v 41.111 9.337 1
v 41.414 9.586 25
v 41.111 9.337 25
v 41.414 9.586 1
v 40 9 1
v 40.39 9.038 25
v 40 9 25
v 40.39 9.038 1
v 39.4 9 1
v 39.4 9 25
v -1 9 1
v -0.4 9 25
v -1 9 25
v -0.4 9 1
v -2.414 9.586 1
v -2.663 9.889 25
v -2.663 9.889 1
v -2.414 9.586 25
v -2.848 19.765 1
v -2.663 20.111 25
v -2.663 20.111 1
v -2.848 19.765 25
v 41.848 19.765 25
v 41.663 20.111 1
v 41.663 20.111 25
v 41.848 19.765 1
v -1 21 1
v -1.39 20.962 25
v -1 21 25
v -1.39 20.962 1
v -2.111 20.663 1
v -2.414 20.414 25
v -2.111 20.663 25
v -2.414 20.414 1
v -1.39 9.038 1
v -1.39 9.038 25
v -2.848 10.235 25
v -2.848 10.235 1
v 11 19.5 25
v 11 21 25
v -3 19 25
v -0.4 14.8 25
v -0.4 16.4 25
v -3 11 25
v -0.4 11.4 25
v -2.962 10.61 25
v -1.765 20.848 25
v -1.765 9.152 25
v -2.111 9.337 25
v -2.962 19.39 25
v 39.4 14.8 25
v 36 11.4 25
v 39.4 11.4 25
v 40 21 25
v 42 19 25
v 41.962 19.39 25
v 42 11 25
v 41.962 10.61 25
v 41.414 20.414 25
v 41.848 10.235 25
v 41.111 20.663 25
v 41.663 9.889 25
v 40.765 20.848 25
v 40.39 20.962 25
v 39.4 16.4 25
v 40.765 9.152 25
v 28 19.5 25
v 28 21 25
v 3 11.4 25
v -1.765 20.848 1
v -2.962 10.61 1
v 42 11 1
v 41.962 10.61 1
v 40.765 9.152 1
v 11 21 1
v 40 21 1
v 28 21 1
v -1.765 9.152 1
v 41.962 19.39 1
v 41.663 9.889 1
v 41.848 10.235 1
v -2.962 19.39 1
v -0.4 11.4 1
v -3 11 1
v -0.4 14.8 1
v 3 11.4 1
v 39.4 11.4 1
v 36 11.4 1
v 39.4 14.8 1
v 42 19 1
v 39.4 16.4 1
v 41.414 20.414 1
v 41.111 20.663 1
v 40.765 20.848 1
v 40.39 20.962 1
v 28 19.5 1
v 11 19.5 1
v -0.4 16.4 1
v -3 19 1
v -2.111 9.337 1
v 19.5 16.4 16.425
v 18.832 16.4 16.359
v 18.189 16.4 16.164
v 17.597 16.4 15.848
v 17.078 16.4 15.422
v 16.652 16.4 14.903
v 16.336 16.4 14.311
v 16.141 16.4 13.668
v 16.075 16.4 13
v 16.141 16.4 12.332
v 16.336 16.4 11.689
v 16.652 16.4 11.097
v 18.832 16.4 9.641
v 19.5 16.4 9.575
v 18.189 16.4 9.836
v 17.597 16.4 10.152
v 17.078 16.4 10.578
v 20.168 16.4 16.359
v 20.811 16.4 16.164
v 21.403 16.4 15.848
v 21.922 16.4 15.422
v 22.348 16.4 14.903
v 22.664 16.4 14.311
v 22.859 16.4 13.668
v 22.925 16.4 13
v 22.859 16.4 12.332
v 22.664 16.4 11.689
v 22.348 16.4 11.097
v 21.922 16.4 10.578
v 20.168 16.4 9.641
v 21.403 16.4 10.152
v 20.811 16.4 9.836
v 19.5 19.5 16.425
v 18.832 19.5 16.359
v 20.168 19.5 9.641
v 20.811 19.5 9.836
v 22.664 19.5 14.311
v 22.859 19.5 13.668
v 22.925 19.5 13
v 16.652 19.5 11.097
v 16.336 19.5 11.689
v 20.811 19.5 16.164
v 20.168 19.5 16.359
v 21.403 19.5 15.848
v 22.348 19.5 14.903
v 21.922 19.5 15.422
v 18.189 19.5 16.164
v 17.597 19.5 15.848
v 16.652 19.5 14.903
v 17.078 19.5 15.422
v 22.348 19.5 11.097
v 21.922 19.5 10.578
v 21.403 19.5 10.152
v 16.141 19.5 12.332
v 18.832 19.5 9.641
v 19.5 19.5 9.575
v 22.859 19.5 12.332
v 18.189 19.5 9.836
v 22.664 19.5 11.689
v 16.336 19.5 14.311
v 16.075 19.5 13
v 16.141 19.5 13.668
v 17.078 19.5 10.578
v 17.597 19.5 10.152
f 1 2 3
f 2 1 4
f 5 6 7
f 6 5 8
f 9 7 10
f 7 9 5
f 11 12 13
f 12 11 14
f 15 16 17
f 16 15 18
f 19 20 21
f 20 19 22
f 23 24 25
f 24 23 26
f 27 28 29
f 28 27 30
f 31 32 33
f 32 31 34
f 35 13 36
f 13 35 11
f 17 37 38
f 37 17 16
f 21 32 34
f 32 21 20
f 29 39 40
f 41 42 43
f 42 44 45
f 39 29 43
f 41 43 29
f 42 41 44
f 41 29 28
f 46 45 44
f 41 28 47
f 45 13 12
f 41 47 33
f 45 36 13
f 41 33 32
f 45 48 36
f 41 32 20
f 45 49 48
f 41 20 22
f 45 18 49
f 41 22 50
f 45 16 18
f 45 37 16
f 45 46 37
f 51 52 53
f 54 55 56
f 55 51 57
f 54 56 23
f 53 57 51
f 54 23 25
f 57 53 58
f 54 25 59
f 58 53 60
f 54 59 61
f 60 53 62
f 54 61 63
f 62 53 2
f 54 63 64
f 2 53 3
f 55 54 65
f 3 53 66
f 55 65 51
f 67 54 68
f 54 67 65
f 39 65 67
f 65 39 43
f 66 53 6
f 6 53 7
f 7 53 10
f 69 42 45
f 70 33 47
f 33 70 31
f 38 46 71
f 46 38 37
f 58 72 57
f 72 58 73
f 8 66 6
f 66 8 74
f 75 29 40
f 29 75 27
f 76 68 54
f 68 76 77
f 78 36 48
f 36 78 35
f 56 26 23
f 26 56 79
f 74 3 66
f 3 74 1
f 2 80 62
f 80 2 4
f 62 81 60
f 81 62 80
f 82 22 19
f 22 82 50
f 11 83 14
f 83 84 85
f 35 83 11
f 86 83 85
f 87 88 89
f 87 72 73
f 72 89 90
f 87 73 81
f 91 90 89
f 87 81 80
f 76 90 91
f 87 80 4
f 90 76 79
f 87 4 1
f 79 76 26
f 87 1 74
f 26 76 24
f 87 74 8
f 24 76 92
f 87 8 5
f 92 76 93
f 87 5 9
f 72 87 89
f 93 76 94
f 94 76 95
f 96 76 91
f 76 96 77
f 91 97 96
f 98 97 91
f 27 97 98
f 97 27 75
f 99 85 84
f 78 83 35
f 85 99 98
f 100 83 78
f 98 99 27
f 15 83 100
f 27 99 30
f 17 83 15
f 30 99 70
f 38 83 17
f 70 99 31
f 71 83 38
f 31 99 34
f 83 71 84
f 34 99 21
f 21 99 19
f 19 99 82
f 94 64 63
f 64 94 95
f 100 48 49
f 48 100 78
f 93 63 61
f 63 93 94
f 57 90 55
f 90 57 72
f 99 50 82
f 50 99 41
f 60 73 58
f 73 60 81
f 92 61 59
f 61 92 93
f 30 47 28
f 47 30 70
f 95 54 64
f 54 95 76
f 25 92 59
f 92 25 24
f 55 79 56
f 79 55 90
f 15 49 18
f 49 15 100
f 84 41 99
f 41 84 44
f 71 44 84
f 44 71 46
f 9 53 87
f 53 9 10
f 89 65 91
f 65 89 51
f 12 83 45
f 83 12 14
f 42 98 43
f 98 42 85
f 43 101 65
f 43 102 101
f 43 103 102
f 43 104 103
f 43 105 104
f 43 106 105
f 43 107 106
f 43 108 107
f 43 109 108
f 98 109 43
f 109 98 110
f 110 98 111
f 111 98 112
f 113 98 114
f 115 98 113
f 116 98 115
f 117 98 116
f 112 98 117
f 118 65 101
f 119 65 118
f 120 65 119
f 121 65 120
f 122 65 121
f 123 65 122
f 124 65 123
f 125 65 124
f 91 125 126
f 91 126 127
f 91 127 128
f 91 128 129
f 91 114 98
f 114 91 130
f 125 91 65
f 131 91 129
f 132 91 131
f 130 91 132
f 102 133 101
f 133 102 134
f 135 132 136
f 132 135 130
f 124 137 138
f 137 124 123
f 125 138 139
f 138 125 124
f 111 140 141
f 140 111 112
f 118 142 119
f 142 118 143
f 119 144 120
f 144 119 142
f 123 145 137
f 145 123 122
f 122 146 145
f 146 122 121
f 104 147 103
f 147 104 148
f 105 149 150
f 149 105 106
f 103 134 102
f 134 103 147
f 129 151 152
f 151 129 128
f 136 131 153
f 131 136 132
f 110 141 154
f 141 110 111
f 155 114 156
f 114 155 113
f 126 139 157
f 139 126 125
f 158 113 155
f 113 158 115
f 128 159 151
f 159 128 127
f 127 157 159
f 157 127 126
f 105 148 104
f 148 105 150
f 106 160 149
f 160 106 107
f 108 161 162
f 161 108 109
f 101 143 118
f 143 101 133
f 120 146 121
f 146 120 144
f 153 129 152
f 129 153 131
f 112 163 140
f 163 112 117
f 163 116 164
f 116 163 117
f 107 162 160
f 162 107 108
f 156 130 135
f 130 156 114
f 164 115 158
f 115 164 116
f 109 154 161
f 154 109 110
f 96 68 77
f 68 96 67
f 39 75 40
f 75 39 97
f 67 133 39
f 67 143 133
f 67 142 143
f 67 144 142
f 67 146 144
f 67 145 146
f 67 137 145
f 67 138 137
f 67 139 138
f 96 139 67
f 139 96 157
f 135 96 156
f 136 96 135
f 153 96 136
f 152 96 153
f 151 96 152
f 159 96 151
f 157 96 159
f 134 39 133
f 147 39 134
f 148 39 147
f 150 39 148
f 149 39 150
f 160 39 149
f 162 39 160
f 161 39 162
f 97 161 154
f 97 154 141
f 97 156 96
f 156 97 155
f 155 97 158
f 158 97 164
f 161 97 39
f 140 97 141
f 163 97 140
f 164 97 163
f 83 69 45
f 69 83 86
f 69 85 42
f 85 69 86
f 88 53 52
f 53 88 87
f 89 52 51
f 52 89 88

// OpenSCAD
translate([-3, 06, 1]) clamp();
% translate([0, 0, -1]) color("grey") arca();

module arca() {
    difference() {
        block(39, 16, 50, crad=0.5);
    
        points = [[0, 0], [4, 0], [0, 4]];
        translate([-0.01, 16-5, -10]) rotate([]) linear_extrude(height=70) polygon(points);
        translate([39+0.01, 16-5, -10]) rotate([]) mirror([1, 0]) linear_extrude(height=70) polygon(points);
    }
}

module clamp() {
    
    difference() {
        translate([0, 3]) block(39+6, 12, 24, crad=2);
        translate([3-.4, 0, -1]) cube([39.8, 10.4, 100]);
        
        translate([45/2, 20, 24/2]) rotate([90, 0, 0]) cylinder($fn=32, d=6.35+0.5, h=20);
        
        translate([45/2-(16+1)/2, 13.5, -1]) cube([16+1, 10, 100]);
    }
    
    points = [[0, 0], [4, 0], [0, 4]];
    translate([3-1, 5+0.4]) rotate([]) linear_extrude(height=24) polygon(points);
    translate([39+4-0, 5+0.4]) rotate([]) mirror([1, 0]) linear_extrude(height=24) polygon(points);
    
}

module block(width, depth, height, crad=3, red=0) {
    hull() {    
        translate([crad, crad]) cylinder($fn=32, h=height, r=crad-red);
        translate([width-crad, crad]) cylinder($fn=32, h=height, r=crad-red);
        translate([crad, depth-crad]) cylinder($fn=32, h=height, r=crad-red);
        translate([width-crad, depth-crad]) cylinder($fn=32, h=height, r=crad-red);
    }
}
